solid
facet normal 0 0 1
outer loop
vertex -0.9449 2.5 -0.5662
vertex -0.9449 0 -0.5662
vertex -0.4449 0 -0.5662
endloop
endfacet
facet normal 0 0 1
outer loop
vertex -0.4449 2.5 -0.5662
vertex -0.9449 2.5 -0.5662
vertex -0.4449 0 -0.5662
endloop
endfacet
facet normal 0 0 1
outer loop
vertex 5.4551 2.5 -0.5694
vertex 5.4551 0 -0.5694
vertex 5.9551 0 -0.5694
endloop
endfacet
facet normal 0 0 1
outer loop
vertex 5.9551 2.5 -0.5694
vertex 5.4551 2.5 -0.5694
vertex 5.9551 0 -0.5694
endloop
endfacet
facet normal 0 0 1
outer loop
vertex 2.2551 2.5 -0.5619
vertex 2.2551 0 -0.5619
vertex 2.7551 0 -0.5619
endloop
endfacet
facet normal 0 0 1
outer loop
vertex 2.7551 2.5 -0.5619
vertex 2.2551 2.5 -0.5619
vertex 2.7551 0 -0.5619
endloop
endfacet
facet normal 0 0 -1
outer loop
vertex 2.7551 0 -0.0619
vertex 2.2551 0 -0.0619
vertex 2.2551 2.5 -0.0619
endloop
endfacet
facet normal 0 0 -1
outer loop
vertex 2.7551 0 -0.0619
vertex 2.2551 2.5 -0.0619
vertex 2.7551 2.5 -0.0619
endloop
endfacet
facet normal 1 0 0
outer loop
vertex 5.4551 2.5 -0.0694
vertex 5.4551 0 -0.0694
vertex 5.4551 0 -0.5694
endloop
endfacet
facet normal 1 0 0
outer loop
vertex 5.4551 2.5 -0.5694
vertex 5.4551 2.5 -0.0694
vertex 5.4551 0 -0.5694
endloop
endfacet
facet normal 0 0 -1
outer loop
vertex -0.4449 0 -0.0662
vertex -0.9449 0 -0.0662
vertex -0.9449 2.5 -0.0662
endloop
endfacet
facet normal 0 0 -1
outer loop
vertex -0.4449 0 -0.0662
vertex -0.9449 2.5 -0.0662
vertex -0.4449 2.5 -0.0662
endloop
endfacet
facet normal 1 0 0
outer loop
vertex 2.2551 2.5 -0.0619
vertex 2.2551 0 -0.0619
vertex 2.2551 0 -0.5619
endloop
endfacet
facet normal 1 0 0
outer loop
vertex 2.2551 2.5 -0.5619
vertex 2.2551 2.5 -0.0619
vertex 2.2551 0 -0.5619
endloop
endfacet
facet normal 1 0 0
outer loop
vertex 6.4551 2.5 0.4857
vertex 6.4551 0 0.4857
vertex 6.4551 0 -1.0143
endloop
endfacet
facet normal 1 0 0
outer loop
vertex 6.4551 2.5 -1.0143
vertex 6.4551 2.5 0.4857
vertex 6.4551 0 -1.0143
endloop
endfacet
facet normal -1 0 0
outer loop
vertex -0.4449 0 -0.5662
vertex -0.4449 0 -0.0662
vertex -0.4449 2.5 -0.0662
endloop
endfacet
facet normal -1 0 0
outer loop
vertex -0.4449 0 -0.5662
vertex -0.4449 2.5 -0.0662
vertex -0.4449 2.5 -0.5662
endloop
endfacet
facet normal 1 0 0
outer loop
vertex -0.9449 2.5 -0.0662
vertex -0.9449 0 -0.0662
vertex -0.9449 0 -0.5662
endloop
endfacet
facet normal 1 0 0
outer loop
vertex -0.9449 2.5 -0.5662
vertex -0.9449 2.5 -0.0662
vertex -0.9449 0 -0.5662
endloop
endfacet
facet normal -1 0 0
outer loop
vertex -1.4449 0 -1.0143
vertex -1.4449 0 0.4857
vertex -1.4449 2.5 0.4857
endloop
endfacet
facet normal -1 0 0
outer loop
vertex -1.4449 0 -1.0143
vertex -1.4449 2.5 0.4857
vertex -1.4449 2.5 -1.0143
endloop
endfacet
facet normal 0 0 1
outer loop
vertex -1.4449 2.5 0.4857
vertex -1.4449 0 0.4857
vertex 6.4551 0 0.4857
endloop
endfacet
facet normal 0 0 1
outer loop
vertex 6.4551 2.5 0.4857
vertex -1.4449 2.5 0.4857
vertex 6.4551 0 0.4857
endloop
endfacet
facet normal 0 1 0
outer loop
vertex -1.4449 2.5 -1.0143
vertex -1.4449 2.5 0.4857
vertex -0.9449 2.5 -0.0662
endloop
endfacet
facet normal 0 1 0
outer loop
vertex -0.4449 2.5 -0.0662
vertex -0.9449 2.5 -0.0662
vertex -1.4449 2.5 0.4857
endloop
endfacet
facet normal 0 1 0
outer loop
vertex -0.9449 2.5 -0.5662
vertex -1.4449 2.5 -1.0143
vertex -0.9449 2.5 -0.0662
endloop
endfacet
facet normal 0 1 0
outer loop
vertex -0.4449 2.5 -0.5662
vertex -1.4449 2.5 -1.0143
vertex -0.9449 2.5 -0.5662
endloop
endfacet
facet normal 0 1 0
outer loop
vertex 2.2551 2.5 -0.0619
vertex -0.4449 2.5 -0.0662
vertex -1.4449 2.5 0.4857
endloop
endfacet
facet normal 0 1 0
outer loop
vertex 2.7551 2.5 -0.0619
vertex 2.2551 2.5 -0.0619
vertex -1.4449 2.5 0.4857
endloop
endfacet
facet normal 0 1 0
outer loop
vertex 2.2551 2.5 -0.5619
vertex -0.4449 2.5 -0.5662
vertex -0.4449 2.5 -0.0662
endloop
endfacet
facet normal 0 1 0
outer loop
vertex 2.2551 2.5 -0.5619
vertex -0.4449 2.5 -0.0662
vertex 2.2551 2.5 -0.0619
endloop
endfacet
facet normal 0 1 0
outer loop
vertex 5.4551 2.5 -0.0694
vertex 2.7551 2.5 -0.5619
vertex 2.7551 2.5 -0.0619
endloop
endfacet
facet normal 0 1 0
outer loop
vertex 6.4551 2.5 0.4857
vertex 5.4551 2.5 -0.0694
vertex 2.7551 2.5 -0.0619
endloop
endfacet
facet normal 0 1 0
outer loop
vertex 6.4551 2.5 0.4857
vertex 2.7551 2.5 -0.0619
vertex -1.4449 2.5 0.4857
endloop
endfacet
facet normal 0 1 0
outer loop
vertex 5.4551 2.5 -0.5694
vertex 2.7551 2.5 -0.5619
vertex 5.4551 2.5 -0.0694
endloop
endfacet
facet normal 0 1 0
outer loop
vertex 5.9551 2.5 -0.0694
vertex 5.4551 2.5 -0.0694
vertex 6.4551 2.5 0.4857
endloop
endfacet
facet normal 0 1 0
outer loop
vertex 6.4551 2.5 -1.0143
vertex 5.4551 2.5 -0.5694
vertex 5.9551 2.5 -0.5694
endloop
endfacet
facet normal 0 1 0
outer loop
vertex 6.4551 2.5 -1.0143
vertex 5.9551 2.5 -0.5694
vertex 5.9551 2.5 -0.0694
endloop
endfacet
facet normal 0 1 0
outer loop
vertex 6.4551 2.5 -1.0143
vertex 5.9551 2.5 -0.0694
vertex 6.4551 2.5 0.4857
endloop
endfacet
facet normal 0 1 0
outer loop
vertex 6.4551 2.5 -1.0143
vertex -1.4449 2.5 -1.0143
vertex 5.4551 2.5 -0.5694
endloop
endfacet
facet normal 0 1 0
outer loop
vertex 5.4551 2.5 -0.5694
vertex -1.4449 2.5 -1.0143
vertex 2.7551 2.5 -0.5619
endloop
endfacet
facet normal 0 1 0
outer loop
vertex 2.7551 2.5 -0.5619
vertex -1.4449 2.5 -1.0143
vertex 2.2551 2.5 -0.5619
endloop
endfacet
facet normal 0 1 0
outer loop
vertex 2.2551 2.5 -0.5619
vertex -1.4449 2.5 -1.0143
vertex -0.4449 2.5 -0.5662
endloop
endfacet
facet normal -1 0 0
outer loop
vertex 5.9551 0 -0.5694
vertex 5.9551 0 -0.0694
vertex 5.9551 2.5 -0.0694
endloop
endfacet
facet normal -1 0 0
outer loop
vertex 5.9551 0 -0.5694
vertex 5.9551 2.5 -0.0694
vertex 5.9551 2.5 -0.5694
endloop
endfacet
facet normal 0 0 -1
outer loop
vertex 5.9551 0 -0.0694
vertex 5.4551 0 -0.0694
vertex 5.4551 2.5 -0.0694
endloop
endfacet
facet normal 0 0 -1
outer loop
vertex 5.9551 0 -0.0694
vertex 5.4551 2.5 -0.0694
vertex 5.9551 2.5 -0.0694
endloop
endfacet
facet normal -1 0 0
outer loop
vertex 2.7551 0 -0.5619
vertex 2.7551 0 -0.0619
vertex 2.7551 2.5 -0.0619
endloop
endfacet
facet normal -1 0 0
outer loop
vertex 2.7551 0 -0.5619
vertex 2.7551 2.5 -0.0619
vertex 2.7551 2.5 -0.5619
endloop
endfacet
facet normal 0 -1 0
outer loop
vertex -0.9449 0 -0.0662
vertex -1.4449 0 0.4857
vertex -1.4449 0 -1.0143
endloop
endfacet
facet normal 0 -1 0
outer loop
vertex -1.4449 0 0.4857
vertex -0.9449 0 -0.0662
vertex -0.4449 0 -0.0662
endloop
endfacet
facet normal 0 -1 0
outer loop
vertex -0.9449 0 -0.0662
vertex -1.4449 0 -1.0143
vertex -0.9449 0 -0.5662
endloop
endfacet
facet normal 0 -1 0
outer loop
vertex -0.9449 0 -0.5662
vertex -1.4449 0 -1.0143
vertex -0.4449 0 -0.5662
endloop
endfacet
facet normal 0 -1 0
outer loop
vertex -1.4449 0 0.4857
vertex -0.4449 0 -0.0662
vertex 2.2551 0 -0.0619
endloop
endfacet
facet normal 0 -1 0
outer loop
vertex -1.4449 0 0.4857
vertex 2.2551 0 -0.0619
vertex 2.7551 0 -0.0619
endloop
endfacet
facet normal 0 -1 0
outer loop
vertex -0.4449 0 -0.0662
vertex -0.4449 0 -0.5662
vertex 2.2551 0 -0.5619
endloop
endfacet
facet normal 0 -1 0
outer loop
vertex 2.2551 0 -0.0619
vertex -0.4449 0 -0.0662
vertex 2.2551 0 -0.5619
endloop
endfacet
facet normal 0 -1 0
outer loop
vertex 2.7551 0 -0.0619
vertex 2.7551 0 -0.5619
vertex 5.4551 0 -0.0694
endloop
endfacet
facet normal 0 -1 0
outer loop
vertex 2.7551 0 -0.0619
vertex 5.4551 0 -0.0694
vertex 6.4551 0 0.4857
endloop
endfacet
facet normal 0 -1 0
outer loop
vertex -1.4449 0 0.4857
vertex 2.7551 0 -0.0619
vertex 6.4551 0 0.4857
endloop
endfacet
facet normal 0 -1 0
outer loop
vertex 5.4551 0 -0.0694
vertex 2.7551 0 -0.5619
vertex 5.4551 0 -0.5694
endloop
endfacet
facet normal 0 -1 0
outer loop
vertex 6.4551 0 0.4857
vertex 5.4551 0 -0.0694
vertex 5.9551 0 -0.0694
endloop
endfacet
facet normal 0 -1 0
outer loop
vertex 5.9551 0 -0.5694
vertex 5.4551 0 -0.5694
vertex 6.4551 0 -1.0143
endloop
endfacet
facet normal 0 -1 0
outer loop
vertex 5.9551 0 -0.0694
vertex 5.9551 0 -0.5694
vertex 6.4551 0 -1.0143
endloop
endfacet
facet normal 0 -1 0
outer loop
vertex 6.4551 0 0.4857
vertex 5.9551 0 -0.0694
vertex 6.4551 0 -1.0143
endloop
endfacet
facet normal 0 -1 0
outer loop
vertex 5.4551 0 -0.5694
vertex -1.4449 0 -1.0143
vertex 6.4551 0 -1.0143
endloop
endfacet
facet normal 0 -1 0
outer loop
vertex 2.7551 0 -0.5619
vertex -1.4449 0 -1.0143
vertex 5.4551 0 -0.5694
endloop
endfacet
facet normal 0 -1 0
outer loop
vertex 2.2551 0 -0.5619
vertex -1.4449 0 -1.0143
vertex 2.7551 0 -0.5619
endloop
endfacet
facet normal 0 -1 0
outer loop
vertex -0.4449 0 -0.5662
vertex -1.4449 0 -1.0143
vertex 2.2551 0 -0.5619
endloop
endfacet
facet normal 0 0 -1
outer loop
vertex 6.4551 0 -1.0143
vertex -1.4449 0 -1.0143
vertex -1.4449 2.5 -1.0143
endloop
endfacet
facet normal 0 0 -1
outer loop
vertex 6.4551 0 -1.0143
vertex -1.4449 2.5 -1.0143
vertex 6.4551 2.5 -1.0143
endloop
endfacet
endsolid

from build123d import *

# Parameters (mm, degrees)
SKETCH1_W           = 7.9
SKETCH1_H           = 1.5
SKETCH1_W_2         = 0.5
SKETCH1_H_2         = 0.5
BOSS_EXTRUDE1_DEPTH = 2.5


with BuildPart() as part:
    # Sketch1 → Boss-Extrude1 (new body)
    with BuildSketch(Plane(origin=(0, 0, 0), x_dir=(1, 0, 0), z_dir=(0, 1, 0))):
        with Locations((2.505127678, 0.264314746)):
            Rectangle(SKETCH1_W, SKETCH1_H)
        with Locations((-0.694872322, 0.316232633)):
            Rectangle(SKETCH1_W_2, SKETCH1_H_2, mode=Mode.SUBTRACT)
        with Locations((5.705127678, 0.319368521)):
            Rectangle(SKETCH1_W_2, SKETCH1_H_2, mode=Mode.SUBTRACT)
        with Locations((2.505127678, 0.311937798)):
            Rectangle(SKETCH1_W_2, SKETCH1_H_2, mode=Mode.SUBTRACT)
    extrude(amount=BOSS_EXTRUDE1_DEPTH)


solid = part.part
